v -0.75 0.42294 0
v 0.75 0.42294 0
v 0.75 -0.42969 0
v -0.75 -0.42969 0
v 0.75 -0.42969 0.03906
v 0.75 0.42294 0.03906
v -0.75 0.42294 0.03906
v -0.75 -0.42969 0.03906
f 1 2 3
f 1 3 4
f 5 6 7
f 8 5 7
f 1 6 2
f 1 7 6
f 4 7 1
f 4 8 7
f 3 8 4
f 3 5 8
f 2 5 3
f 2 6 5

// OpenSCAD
translate([-0.75, -0.4296875, 0.0])
rotate([0, 0, 0])
linear_extrude(height=0.0390625)
    polygon(points=[[1.5, 0.0], [1.5, 0.8526315789473684], [0.0, 0.8526315789473684], [0.0, 0.0]]);
